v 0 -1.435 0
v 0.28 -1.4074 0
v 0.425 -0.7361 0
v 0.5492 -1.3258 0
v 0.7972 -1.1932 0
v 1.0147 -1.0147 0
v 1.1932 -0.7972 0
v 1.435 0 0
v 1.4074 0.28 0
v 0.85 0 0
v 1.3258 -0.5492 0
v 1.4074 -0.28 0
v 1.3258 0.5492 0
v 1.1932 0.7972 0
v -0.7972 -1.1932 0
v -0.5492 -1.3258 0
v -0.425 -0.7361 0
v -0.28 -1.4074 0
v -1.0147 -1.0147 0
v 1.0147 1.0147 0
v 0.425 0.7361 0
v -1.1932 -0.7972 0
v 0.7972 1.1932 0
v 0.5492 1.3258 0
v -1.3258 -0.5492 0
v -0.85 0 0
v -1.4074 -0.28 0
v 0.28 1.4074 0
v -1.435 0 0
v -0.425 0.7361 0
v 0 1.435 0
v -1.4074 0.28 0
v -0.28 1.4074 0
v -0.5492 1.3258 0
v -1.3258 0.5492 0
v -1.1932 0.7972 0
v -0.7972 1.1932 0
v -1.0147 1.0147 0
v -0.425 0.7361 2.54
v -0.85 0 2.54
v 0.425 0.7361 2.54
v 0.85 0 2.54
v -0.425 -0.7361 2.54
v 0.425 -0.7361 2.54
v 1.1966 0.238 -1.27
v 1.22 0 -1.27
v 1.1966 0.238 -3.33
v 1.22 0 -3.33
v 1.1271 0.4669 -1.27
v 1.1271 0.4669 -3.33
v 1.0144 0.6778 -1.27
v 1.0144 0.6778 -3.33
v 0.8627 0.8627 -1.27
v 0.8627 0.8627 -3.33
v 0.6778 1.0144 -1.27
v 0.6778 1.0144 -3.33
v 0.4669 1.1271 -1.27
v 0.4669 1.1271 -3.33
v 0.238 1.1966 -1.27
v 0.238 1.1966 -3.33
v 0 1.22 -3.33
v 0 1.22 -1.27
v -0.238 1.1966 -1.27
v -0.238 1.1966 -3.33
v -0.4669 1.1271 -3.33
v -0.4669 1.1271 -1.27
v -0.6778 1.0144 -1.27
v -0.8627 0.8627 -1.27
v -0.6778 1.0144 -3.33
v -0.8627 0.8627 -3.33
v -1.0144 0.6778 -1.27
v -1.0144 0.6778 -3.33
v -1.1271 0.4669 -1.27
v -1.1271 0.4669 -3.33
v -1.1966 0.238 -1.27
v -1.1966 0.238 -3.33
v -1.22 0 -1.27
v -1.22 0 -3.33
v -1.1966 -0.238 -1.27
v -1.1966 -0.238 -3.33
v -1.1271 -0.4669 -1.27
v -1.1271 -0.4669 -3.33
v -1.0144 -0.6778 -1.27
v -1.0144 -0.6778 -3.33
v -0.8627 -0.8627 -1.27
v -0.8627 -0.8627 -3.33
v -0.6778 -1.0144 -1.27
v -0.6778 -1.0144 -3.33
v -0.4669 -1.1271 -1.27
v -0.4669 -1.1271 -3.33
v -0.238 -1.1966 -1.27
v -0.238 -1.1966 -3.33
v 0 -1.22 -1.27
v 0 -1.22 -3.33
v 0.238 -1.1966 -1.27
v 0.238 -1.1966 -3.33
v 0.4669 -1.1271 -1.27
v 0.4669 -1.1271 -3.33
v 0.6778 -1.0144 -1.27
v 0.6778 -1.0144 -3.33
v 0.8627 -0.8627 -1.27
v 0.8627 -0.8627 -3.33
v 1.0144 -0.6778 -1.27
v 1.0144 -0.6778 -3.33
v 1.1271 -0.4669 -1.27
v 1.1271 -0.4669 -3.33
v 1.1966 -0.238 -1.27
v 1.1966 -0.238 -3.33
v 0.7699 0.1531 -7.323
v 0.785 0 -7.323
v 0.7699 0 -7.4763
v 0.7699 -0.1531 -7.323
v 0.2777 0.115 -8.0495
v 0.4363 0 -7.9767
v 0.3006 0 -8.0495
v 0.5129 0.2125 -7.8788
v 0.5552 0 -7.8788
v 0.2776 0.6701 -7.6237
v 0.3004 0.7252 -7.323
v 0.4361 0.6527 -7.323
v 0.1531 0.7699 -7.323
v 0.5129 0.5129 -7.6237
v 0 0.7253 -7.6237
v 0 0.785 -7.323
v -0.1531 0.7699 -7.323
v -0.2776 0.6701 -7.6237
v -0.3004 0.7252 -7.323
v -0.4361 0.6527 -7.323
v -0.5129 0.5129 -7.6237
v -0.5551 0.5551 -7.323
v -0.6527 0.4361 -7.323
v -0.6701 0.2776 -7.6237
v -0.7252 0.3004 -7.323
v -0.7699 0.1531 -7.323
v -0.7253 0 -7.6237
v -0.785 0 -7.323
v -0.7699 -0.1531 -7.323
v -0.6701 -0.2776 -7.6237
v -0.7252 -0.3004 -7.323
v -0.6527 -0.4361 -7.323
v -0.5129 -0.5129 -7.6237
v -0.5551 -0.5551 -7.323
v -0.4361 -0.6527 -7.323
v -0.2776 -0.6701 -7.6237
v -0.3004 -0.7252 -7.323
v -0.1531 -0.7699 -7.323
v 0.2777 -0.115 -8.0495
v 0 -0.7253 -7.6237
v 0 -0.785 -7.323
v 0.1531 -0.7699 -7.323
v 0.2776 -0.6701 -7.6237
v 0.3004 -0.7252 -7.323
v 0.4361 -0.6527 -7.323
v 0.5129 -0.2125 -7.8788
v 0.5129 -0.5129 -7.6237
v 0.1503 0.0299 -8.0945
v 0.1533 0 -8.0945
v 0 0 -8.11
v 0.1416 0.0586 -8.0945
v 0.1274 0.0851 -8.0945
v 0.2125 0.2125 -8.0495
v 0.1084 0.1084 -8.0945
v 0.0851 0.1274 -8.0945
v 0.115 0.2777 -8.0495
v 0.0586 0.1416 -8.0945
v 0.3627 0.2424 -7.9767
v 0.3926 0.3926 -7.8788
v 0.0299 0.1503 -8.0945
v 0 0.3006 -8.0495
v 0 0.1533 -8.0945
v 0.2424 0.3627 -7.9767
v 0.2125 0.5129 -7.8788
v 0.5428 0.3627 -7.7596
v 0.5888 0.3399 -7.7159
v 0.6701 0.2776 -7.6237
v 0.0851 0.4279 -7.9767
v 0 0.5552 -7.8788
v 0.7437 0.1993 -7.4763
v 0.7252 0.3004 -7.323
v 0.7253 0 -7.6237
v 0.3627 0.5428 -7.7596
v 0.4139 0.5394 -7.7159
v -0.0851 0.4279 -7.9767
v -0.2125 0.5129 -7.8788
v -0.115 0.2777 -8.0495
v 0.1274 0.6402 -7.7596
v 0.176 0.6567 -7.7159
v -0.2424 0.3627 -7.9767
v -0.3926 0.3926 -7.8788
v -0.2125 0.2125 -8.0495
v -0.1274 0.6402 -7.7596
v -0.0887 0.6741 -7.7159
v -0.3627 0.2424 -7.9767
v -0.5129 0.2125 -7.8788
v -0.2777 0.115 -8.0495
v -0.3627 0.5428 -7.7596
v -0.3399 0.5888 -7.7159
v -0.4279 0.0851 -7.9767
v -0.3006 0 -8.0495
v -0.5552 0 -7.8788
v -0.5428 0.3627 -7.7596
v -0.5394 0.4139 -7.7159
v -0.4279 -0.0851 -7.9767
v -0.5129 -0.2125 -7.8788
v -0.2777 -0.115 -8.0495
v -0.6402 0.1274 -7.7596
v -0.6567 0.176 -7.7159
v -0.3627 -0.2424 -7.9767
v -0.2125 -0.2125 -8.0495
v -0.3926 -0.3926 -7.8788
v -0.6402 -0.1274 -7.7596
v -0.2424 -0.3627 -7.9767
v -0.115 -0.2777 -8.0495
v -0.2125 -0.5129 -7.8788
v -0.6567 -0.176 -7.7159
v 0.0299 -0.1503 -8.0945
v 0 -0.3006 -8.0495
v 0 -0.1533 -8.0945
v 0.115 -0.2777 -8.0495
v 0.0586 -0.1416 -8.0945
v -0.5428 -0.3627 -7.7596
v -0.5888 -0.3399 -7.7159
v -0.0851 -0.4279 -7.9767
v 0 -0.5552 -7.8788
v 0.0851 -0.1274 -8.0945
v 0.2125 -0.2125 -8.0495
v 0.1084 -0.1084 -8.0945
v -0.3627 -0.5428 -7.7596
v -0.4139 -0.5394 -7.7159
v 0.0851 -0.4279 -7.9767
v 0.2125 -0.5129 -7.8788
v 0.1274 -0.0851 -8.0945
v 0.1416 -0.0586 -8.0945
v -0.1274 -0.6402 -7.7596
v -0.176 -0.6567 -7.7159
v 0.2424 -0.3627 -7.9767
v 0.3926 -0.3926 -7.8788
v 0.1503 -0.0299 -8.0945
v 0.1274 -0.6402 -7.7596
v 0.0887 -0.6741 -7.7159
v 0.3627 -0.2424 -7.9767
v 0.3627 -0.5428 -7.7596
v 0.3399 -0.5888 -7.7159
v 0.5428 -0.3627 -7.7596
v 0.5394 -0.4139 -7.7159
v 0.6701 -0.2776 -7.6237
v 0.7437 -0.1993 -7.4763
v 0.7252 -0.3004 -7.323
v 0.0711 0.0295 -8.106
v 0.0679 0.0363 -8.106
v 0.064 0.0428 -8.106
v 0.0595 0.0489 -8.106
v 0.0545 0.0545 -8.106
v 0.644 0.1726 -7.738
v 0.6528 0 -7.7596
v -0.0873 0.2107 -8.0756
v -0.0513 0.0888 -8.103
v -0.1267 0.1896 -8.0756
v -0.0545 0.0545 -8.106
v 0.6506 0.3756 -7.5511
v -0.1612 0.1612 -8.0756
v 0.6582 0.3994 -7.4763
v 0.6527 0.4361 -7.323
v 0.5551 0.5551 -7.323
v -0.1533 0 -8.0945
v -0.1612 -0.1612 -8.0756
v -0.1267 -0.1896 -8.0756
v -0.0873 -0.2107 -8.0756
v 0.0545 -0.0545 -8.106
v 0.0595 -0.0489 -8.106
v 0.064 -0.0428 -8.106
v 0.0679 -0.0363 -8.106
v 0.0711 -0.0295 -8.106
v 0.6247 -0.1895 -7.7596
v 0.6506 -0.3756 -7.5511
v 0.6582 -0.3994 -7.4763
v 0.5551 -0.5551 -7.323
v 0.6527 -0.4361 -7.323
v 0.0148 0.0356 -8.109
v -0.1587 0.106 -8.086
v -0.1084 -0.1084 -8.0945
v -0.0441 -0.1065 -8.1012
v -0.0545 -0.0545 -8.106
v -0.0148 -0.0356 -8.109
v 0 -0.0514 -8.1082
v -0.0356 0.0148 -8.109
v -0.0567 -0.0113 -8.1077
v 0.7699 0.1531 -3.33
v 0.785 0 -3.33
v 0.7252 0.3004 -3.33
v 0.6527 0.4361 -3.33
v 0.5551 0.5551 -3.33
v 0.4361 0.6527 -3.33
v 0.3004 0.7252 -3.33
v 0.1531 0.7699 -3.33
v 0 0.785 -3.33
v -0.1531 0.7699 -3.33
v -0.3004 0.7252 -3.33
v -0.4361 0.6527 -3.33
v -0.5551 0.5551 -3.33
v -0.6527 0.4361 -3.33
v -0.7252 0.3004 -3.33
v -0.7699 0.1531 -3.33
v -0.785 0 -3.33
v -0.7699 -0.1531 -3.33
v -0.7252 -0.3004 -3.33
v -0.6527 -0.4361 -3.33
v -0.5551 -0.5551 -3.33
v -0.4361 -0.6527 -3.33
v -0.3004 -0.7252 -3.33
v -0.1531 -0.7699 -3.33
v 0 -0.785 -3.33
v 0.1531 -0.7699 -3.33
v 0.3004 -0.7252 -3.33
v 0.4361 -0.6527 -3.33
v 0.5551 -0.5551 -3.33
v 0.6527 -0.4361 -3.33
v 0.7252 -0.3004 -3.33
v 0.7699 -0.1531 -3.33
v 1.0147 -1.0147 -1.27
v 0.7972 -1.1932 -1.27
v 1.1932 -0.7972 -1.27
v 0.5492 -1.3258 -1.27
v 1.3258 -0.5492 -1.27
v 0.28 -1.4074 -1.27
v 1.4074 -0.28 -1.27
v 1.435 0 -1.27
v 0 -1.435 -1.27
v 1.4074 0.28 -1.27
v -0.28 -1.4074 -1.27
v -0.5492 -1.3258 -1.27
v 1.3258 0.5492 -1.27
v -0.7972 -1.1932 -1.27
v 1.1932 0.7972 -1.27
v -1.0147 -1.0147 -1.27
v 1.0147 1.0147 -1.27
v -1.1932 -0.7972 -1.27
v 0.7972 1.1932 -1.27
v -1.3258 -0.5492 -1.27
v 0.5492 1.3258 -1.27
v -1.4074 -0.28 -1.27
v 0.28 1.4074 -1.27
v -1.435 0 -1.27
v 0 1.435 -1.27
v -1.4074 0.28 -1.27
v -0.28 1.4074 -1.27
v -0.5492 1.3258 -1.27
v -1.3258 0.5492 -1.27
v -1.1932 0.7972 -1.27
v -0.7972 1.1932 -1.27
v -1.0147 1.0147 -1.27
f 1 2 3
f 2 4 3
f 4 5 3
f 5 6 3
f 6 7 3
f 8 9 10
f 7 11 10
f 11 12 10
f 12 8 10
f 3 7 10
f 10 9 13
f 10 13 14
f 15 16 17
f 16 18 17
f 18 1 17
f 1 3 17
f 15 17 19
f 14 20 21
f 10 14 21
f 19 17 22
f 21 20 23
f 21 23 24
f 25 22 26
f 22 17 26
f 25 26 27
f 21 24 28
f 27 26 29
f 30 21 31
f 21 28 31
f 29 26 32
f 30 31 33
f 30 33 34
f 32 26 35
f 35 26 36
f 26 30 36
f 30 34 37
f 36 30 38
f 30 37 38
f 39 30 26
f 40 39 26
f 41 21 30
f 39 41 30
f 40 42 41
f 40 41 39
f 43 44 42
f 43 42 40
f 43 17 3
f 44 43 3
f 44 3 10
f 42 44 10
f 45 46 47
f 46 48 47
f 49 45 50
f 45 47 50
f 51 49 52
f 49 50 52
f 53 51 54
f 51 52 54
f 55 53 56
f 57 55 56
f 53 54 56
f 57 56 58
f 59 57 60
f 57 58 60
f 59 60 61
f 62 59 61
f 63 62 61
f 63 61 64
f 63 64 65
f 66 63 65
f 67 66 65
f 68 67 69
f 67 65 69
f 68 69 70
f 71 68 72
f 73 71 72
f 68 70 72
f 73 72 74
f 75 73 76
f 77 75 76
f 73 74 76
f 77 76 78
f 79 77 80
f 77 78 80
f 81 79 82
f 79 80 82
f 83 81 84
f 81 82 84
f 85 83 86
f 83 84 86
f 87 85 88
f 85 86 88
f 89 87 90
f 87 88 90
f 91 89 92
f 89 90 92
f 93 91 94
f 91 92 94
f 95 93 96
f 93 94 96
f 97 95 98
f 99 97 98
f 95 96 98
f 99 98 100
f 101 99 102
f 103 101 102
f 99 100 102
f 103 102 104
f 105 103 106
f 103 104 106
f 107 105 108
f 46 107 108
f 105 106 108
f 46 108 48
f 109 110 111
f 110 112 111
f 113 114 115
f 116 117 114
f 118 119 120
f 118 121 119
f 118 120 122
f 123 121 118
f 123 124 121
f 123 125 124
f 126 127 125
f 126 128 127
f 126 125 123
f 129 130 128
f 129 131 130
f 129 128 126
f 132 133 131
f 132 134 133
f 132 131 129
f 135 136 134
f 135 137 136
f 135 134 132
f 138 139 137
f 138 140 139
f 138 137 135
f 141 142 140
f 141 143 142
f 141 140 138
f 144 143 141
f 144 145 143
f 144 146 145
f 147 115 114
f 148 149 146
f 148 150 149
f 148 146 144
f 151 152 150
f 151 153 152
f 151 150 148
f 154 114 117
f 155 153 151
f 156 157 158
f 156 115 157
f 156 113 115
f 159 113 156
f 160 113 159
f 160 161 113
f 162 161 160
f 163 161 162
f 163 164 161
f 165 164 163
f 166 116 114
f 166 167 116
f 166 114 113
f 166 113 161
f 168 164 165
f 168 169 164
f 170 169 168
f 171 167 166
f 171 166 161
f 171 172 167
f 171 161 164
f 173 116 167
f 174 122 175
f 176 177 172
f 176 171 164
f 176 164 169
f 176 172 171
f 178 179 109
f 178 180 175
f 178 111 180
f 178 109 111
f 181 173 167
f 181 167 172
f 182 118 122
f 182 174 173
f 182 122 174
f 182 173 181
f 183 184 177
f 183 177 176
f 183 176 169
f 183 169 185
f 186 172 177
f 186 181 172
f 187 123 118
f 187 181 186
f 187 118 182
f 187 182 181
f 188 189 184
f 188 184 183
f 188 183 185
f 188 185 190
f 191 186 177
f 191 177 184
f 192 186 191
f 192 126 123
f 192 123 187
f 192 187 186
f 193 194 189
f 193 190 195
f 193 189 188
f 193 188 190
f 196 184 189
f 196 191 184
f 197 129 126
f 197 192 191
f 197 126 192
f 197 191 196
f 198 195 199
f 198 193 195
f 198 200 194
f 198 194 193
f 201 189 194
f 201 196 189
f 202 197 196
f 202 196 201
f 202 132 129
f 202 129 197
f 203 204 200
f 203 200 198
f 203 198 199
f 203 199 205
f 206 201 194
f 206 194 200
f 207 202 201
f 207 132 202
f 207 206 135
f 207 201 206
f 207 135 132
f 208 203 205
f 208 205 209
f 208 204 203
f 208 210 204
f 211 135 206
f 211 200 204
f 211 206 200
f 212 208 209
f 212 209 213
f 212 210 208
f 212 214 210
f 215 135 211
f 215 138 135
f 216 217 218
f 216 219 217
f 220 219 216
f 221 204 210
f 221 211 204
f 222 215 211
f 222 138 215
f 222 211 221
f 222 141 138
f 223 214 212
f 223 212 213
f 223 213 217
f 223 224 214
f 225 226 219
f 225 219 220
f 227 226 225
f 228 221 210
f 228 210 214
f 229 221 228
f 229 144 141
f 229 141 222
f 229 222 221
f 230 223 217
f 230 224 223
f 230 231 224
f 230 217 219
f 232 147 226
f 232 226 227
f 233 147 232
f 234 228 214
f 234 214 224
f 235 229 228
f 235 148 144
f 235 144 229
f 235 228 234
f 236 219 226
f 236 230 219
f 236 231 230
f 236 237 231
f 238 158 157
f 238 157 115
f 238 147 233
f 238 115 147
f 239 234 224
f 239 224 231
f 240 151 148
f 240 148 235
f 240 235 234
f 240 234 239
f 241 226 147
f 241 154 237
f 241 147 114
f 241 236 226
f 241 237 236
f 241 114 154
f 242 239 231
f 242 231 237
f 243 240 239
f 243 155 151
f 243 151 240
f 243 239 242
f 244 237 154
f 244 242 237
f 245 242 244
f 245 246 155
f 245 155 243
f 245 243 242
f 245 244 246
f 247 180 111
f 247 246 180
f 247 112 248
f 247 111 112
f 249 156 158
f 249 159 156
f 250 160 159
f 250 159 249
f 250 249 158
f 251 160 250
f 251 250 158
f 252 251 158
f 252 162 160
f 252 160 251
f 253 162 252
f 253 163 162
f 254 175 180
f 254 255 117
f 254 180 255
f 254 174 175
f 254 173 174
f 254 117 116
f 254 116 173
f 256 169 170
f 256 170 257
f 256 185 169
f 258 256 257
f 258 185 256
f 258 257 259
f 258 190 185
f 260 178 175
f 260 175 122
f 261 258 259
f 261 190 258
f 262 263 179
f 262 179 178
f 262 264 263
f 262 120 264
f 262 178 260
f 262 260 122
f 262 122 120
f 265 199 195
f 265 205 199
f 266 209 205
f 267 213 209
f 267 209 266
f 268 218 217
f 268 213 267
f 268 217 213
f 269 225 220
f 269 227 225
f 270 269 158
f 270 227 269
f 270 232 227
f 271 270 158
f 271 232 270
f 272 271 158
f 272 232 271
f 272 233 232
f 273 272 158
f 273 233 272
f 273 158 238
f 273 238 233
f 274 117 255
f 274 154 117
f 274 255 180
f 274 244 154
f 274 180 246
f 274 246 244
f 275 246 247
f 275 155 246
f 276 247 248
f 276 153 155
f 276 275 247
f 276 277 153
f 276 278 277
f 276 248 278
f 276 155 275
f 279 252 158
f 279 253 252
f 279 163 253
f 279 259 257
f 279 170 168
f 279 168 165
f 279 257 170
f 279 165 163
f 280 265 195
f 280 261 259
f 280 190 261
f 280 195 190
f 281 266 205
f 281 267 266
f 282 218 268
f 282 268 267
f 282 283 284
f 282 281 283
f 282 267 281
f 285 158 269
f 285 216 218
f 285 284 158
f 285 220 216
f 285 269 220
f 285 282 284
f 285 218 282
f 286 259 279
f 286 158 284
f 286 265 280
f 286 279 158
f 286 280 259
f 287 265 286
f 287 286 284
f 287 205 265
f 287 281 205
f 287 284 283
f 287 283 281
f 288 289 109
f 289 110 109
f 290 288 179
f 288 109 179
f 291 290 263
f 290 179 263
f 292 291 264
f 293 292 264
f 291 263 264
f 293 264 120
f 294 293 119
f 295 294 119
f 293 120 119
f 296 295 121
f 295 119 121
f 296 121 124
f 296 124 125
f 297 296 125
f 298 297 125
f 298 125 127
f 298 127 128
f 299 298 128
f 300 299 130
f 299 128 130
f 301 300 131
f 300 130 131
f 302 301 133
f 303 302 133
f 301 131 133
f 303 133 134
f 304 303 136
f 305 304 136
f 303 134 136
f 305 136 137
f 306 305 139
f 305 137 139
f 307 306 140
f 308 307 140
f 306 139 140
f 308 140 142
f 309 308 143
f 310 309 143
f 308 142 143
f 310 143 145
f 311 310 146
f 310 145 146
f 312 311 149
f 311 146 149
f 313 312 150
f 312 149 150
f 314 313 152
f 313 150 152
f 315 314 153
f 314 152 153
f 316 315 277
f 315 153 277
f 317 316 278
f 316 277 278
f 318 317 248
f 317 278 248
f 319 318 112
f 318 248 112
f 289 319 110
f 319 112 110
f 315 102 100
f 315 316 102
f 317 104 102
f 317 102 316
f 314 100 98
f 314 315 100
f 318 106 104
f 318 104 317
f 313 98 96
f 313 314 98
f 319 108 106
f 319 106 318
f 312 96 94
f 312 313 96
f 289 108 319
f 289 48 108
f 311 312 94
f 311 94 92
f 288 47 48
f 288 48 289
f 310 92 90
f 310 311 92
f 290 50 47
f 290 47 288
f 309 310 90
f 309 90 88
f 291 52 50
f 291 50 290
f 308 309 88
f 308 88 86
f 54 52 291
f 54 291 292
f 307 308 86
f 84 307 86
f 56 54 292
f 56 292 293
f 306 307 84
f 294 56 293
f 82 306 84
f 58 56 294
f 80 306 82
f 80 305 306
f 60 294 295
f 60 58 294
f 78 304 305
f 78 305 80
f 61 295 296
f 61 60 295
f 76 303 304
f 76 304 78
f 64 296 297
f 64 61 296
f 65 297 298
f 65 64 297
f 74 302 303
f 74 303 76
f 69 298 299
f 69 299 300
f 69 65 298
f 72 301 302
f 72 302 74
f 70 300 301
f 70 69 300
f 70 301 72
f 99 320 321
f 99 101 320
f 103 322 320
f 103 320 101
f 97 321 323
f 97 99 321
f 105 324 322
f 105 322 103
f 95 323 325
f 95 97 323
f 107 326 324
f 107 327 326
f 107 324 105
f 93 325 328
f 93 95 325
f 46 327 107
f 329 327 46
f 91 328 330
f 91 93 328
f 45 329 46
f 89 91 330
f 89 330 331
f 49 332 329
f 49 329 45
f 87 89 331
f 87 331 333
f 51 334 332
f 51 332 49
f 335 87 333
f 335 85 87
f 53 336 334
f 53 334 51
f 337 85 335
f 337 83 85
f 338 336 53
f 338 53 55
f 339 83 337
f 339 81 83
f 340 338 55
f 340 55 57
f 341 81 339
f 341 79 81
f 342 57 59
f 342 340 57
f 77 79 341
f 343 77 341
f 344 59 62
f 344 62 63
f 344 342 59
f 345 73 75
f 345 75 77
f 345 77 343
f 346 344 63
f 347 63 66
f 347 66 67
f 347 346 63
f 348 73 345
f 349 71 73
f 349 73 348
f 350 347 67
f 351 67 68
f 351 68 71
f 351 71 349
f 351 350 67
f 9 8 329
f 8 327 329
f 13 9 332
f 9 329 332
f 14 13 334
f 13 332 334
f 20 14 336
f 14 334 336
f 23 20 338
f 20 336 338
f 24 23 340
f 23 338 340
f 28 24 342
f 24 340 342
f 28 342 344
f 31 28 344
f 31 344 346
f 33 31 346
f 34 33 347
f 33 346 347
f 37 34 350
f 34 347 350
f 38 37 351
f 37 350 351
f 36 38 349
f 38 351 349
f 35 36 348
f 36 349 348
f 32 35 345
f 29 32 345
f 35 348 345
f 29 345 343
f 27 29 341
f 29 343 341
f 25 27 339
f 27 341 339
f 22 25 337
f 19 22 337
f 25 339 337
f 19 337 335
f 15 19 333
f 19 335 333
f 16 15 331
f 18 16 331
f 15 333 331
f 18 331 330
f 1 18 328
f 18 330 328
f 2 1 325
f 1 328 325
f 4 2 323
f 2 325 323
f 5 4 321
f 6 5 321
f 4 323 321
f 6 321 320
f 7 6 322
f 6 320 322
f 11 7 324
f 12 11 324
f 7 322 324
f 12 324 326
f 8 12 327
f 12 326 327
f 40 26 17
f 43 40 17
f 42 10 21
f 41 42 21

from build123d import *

# Parameters (mm, degrees)
PAD_DEPTH = 2.54


with BuildPart() as part:
    # Sketch → Revolution (revolve)
    with BuildSketch(Plane.XZ):
        with BuildLine():
            Line((0, 0), (1.435, 0))
            Line((1.435, 0), (1.435, -1.27))
            Line((1.22, -1.27), (1.435, -1.27))
            Line((1.22, -1.27), (1.22, -3.33))
            Line((0.785, -3.33), (1.22, -3.33))
            Line((0.785, -3.33), (0.785, -7.32302))
            ThreePointArc((0, -8.11), (0.555199, -7.878799), (0.785, -7.32302))
            Line((0, 0), (0, -8.11))
        make_face()
    revolve(axis=Axis((0, 0, 0), (0, 0, 1)))

    # Sketch001 (on Face1 of Revolution) → Pad (new body)
    with BuildSketch(Plane(origin=(0, 0, 0), x_dir=(-1, 0, 0), z_dir=(0, 0, 1))):
        Polygon((0.425, 0.736122), (-0.425, 0.736122), (-0.85, 0), (-0.425, -0.736122), (0.425, -0.736122), (0.85, 0), align=None)
    extrude(amount=PAD_DEPTH)


solid = part.part
